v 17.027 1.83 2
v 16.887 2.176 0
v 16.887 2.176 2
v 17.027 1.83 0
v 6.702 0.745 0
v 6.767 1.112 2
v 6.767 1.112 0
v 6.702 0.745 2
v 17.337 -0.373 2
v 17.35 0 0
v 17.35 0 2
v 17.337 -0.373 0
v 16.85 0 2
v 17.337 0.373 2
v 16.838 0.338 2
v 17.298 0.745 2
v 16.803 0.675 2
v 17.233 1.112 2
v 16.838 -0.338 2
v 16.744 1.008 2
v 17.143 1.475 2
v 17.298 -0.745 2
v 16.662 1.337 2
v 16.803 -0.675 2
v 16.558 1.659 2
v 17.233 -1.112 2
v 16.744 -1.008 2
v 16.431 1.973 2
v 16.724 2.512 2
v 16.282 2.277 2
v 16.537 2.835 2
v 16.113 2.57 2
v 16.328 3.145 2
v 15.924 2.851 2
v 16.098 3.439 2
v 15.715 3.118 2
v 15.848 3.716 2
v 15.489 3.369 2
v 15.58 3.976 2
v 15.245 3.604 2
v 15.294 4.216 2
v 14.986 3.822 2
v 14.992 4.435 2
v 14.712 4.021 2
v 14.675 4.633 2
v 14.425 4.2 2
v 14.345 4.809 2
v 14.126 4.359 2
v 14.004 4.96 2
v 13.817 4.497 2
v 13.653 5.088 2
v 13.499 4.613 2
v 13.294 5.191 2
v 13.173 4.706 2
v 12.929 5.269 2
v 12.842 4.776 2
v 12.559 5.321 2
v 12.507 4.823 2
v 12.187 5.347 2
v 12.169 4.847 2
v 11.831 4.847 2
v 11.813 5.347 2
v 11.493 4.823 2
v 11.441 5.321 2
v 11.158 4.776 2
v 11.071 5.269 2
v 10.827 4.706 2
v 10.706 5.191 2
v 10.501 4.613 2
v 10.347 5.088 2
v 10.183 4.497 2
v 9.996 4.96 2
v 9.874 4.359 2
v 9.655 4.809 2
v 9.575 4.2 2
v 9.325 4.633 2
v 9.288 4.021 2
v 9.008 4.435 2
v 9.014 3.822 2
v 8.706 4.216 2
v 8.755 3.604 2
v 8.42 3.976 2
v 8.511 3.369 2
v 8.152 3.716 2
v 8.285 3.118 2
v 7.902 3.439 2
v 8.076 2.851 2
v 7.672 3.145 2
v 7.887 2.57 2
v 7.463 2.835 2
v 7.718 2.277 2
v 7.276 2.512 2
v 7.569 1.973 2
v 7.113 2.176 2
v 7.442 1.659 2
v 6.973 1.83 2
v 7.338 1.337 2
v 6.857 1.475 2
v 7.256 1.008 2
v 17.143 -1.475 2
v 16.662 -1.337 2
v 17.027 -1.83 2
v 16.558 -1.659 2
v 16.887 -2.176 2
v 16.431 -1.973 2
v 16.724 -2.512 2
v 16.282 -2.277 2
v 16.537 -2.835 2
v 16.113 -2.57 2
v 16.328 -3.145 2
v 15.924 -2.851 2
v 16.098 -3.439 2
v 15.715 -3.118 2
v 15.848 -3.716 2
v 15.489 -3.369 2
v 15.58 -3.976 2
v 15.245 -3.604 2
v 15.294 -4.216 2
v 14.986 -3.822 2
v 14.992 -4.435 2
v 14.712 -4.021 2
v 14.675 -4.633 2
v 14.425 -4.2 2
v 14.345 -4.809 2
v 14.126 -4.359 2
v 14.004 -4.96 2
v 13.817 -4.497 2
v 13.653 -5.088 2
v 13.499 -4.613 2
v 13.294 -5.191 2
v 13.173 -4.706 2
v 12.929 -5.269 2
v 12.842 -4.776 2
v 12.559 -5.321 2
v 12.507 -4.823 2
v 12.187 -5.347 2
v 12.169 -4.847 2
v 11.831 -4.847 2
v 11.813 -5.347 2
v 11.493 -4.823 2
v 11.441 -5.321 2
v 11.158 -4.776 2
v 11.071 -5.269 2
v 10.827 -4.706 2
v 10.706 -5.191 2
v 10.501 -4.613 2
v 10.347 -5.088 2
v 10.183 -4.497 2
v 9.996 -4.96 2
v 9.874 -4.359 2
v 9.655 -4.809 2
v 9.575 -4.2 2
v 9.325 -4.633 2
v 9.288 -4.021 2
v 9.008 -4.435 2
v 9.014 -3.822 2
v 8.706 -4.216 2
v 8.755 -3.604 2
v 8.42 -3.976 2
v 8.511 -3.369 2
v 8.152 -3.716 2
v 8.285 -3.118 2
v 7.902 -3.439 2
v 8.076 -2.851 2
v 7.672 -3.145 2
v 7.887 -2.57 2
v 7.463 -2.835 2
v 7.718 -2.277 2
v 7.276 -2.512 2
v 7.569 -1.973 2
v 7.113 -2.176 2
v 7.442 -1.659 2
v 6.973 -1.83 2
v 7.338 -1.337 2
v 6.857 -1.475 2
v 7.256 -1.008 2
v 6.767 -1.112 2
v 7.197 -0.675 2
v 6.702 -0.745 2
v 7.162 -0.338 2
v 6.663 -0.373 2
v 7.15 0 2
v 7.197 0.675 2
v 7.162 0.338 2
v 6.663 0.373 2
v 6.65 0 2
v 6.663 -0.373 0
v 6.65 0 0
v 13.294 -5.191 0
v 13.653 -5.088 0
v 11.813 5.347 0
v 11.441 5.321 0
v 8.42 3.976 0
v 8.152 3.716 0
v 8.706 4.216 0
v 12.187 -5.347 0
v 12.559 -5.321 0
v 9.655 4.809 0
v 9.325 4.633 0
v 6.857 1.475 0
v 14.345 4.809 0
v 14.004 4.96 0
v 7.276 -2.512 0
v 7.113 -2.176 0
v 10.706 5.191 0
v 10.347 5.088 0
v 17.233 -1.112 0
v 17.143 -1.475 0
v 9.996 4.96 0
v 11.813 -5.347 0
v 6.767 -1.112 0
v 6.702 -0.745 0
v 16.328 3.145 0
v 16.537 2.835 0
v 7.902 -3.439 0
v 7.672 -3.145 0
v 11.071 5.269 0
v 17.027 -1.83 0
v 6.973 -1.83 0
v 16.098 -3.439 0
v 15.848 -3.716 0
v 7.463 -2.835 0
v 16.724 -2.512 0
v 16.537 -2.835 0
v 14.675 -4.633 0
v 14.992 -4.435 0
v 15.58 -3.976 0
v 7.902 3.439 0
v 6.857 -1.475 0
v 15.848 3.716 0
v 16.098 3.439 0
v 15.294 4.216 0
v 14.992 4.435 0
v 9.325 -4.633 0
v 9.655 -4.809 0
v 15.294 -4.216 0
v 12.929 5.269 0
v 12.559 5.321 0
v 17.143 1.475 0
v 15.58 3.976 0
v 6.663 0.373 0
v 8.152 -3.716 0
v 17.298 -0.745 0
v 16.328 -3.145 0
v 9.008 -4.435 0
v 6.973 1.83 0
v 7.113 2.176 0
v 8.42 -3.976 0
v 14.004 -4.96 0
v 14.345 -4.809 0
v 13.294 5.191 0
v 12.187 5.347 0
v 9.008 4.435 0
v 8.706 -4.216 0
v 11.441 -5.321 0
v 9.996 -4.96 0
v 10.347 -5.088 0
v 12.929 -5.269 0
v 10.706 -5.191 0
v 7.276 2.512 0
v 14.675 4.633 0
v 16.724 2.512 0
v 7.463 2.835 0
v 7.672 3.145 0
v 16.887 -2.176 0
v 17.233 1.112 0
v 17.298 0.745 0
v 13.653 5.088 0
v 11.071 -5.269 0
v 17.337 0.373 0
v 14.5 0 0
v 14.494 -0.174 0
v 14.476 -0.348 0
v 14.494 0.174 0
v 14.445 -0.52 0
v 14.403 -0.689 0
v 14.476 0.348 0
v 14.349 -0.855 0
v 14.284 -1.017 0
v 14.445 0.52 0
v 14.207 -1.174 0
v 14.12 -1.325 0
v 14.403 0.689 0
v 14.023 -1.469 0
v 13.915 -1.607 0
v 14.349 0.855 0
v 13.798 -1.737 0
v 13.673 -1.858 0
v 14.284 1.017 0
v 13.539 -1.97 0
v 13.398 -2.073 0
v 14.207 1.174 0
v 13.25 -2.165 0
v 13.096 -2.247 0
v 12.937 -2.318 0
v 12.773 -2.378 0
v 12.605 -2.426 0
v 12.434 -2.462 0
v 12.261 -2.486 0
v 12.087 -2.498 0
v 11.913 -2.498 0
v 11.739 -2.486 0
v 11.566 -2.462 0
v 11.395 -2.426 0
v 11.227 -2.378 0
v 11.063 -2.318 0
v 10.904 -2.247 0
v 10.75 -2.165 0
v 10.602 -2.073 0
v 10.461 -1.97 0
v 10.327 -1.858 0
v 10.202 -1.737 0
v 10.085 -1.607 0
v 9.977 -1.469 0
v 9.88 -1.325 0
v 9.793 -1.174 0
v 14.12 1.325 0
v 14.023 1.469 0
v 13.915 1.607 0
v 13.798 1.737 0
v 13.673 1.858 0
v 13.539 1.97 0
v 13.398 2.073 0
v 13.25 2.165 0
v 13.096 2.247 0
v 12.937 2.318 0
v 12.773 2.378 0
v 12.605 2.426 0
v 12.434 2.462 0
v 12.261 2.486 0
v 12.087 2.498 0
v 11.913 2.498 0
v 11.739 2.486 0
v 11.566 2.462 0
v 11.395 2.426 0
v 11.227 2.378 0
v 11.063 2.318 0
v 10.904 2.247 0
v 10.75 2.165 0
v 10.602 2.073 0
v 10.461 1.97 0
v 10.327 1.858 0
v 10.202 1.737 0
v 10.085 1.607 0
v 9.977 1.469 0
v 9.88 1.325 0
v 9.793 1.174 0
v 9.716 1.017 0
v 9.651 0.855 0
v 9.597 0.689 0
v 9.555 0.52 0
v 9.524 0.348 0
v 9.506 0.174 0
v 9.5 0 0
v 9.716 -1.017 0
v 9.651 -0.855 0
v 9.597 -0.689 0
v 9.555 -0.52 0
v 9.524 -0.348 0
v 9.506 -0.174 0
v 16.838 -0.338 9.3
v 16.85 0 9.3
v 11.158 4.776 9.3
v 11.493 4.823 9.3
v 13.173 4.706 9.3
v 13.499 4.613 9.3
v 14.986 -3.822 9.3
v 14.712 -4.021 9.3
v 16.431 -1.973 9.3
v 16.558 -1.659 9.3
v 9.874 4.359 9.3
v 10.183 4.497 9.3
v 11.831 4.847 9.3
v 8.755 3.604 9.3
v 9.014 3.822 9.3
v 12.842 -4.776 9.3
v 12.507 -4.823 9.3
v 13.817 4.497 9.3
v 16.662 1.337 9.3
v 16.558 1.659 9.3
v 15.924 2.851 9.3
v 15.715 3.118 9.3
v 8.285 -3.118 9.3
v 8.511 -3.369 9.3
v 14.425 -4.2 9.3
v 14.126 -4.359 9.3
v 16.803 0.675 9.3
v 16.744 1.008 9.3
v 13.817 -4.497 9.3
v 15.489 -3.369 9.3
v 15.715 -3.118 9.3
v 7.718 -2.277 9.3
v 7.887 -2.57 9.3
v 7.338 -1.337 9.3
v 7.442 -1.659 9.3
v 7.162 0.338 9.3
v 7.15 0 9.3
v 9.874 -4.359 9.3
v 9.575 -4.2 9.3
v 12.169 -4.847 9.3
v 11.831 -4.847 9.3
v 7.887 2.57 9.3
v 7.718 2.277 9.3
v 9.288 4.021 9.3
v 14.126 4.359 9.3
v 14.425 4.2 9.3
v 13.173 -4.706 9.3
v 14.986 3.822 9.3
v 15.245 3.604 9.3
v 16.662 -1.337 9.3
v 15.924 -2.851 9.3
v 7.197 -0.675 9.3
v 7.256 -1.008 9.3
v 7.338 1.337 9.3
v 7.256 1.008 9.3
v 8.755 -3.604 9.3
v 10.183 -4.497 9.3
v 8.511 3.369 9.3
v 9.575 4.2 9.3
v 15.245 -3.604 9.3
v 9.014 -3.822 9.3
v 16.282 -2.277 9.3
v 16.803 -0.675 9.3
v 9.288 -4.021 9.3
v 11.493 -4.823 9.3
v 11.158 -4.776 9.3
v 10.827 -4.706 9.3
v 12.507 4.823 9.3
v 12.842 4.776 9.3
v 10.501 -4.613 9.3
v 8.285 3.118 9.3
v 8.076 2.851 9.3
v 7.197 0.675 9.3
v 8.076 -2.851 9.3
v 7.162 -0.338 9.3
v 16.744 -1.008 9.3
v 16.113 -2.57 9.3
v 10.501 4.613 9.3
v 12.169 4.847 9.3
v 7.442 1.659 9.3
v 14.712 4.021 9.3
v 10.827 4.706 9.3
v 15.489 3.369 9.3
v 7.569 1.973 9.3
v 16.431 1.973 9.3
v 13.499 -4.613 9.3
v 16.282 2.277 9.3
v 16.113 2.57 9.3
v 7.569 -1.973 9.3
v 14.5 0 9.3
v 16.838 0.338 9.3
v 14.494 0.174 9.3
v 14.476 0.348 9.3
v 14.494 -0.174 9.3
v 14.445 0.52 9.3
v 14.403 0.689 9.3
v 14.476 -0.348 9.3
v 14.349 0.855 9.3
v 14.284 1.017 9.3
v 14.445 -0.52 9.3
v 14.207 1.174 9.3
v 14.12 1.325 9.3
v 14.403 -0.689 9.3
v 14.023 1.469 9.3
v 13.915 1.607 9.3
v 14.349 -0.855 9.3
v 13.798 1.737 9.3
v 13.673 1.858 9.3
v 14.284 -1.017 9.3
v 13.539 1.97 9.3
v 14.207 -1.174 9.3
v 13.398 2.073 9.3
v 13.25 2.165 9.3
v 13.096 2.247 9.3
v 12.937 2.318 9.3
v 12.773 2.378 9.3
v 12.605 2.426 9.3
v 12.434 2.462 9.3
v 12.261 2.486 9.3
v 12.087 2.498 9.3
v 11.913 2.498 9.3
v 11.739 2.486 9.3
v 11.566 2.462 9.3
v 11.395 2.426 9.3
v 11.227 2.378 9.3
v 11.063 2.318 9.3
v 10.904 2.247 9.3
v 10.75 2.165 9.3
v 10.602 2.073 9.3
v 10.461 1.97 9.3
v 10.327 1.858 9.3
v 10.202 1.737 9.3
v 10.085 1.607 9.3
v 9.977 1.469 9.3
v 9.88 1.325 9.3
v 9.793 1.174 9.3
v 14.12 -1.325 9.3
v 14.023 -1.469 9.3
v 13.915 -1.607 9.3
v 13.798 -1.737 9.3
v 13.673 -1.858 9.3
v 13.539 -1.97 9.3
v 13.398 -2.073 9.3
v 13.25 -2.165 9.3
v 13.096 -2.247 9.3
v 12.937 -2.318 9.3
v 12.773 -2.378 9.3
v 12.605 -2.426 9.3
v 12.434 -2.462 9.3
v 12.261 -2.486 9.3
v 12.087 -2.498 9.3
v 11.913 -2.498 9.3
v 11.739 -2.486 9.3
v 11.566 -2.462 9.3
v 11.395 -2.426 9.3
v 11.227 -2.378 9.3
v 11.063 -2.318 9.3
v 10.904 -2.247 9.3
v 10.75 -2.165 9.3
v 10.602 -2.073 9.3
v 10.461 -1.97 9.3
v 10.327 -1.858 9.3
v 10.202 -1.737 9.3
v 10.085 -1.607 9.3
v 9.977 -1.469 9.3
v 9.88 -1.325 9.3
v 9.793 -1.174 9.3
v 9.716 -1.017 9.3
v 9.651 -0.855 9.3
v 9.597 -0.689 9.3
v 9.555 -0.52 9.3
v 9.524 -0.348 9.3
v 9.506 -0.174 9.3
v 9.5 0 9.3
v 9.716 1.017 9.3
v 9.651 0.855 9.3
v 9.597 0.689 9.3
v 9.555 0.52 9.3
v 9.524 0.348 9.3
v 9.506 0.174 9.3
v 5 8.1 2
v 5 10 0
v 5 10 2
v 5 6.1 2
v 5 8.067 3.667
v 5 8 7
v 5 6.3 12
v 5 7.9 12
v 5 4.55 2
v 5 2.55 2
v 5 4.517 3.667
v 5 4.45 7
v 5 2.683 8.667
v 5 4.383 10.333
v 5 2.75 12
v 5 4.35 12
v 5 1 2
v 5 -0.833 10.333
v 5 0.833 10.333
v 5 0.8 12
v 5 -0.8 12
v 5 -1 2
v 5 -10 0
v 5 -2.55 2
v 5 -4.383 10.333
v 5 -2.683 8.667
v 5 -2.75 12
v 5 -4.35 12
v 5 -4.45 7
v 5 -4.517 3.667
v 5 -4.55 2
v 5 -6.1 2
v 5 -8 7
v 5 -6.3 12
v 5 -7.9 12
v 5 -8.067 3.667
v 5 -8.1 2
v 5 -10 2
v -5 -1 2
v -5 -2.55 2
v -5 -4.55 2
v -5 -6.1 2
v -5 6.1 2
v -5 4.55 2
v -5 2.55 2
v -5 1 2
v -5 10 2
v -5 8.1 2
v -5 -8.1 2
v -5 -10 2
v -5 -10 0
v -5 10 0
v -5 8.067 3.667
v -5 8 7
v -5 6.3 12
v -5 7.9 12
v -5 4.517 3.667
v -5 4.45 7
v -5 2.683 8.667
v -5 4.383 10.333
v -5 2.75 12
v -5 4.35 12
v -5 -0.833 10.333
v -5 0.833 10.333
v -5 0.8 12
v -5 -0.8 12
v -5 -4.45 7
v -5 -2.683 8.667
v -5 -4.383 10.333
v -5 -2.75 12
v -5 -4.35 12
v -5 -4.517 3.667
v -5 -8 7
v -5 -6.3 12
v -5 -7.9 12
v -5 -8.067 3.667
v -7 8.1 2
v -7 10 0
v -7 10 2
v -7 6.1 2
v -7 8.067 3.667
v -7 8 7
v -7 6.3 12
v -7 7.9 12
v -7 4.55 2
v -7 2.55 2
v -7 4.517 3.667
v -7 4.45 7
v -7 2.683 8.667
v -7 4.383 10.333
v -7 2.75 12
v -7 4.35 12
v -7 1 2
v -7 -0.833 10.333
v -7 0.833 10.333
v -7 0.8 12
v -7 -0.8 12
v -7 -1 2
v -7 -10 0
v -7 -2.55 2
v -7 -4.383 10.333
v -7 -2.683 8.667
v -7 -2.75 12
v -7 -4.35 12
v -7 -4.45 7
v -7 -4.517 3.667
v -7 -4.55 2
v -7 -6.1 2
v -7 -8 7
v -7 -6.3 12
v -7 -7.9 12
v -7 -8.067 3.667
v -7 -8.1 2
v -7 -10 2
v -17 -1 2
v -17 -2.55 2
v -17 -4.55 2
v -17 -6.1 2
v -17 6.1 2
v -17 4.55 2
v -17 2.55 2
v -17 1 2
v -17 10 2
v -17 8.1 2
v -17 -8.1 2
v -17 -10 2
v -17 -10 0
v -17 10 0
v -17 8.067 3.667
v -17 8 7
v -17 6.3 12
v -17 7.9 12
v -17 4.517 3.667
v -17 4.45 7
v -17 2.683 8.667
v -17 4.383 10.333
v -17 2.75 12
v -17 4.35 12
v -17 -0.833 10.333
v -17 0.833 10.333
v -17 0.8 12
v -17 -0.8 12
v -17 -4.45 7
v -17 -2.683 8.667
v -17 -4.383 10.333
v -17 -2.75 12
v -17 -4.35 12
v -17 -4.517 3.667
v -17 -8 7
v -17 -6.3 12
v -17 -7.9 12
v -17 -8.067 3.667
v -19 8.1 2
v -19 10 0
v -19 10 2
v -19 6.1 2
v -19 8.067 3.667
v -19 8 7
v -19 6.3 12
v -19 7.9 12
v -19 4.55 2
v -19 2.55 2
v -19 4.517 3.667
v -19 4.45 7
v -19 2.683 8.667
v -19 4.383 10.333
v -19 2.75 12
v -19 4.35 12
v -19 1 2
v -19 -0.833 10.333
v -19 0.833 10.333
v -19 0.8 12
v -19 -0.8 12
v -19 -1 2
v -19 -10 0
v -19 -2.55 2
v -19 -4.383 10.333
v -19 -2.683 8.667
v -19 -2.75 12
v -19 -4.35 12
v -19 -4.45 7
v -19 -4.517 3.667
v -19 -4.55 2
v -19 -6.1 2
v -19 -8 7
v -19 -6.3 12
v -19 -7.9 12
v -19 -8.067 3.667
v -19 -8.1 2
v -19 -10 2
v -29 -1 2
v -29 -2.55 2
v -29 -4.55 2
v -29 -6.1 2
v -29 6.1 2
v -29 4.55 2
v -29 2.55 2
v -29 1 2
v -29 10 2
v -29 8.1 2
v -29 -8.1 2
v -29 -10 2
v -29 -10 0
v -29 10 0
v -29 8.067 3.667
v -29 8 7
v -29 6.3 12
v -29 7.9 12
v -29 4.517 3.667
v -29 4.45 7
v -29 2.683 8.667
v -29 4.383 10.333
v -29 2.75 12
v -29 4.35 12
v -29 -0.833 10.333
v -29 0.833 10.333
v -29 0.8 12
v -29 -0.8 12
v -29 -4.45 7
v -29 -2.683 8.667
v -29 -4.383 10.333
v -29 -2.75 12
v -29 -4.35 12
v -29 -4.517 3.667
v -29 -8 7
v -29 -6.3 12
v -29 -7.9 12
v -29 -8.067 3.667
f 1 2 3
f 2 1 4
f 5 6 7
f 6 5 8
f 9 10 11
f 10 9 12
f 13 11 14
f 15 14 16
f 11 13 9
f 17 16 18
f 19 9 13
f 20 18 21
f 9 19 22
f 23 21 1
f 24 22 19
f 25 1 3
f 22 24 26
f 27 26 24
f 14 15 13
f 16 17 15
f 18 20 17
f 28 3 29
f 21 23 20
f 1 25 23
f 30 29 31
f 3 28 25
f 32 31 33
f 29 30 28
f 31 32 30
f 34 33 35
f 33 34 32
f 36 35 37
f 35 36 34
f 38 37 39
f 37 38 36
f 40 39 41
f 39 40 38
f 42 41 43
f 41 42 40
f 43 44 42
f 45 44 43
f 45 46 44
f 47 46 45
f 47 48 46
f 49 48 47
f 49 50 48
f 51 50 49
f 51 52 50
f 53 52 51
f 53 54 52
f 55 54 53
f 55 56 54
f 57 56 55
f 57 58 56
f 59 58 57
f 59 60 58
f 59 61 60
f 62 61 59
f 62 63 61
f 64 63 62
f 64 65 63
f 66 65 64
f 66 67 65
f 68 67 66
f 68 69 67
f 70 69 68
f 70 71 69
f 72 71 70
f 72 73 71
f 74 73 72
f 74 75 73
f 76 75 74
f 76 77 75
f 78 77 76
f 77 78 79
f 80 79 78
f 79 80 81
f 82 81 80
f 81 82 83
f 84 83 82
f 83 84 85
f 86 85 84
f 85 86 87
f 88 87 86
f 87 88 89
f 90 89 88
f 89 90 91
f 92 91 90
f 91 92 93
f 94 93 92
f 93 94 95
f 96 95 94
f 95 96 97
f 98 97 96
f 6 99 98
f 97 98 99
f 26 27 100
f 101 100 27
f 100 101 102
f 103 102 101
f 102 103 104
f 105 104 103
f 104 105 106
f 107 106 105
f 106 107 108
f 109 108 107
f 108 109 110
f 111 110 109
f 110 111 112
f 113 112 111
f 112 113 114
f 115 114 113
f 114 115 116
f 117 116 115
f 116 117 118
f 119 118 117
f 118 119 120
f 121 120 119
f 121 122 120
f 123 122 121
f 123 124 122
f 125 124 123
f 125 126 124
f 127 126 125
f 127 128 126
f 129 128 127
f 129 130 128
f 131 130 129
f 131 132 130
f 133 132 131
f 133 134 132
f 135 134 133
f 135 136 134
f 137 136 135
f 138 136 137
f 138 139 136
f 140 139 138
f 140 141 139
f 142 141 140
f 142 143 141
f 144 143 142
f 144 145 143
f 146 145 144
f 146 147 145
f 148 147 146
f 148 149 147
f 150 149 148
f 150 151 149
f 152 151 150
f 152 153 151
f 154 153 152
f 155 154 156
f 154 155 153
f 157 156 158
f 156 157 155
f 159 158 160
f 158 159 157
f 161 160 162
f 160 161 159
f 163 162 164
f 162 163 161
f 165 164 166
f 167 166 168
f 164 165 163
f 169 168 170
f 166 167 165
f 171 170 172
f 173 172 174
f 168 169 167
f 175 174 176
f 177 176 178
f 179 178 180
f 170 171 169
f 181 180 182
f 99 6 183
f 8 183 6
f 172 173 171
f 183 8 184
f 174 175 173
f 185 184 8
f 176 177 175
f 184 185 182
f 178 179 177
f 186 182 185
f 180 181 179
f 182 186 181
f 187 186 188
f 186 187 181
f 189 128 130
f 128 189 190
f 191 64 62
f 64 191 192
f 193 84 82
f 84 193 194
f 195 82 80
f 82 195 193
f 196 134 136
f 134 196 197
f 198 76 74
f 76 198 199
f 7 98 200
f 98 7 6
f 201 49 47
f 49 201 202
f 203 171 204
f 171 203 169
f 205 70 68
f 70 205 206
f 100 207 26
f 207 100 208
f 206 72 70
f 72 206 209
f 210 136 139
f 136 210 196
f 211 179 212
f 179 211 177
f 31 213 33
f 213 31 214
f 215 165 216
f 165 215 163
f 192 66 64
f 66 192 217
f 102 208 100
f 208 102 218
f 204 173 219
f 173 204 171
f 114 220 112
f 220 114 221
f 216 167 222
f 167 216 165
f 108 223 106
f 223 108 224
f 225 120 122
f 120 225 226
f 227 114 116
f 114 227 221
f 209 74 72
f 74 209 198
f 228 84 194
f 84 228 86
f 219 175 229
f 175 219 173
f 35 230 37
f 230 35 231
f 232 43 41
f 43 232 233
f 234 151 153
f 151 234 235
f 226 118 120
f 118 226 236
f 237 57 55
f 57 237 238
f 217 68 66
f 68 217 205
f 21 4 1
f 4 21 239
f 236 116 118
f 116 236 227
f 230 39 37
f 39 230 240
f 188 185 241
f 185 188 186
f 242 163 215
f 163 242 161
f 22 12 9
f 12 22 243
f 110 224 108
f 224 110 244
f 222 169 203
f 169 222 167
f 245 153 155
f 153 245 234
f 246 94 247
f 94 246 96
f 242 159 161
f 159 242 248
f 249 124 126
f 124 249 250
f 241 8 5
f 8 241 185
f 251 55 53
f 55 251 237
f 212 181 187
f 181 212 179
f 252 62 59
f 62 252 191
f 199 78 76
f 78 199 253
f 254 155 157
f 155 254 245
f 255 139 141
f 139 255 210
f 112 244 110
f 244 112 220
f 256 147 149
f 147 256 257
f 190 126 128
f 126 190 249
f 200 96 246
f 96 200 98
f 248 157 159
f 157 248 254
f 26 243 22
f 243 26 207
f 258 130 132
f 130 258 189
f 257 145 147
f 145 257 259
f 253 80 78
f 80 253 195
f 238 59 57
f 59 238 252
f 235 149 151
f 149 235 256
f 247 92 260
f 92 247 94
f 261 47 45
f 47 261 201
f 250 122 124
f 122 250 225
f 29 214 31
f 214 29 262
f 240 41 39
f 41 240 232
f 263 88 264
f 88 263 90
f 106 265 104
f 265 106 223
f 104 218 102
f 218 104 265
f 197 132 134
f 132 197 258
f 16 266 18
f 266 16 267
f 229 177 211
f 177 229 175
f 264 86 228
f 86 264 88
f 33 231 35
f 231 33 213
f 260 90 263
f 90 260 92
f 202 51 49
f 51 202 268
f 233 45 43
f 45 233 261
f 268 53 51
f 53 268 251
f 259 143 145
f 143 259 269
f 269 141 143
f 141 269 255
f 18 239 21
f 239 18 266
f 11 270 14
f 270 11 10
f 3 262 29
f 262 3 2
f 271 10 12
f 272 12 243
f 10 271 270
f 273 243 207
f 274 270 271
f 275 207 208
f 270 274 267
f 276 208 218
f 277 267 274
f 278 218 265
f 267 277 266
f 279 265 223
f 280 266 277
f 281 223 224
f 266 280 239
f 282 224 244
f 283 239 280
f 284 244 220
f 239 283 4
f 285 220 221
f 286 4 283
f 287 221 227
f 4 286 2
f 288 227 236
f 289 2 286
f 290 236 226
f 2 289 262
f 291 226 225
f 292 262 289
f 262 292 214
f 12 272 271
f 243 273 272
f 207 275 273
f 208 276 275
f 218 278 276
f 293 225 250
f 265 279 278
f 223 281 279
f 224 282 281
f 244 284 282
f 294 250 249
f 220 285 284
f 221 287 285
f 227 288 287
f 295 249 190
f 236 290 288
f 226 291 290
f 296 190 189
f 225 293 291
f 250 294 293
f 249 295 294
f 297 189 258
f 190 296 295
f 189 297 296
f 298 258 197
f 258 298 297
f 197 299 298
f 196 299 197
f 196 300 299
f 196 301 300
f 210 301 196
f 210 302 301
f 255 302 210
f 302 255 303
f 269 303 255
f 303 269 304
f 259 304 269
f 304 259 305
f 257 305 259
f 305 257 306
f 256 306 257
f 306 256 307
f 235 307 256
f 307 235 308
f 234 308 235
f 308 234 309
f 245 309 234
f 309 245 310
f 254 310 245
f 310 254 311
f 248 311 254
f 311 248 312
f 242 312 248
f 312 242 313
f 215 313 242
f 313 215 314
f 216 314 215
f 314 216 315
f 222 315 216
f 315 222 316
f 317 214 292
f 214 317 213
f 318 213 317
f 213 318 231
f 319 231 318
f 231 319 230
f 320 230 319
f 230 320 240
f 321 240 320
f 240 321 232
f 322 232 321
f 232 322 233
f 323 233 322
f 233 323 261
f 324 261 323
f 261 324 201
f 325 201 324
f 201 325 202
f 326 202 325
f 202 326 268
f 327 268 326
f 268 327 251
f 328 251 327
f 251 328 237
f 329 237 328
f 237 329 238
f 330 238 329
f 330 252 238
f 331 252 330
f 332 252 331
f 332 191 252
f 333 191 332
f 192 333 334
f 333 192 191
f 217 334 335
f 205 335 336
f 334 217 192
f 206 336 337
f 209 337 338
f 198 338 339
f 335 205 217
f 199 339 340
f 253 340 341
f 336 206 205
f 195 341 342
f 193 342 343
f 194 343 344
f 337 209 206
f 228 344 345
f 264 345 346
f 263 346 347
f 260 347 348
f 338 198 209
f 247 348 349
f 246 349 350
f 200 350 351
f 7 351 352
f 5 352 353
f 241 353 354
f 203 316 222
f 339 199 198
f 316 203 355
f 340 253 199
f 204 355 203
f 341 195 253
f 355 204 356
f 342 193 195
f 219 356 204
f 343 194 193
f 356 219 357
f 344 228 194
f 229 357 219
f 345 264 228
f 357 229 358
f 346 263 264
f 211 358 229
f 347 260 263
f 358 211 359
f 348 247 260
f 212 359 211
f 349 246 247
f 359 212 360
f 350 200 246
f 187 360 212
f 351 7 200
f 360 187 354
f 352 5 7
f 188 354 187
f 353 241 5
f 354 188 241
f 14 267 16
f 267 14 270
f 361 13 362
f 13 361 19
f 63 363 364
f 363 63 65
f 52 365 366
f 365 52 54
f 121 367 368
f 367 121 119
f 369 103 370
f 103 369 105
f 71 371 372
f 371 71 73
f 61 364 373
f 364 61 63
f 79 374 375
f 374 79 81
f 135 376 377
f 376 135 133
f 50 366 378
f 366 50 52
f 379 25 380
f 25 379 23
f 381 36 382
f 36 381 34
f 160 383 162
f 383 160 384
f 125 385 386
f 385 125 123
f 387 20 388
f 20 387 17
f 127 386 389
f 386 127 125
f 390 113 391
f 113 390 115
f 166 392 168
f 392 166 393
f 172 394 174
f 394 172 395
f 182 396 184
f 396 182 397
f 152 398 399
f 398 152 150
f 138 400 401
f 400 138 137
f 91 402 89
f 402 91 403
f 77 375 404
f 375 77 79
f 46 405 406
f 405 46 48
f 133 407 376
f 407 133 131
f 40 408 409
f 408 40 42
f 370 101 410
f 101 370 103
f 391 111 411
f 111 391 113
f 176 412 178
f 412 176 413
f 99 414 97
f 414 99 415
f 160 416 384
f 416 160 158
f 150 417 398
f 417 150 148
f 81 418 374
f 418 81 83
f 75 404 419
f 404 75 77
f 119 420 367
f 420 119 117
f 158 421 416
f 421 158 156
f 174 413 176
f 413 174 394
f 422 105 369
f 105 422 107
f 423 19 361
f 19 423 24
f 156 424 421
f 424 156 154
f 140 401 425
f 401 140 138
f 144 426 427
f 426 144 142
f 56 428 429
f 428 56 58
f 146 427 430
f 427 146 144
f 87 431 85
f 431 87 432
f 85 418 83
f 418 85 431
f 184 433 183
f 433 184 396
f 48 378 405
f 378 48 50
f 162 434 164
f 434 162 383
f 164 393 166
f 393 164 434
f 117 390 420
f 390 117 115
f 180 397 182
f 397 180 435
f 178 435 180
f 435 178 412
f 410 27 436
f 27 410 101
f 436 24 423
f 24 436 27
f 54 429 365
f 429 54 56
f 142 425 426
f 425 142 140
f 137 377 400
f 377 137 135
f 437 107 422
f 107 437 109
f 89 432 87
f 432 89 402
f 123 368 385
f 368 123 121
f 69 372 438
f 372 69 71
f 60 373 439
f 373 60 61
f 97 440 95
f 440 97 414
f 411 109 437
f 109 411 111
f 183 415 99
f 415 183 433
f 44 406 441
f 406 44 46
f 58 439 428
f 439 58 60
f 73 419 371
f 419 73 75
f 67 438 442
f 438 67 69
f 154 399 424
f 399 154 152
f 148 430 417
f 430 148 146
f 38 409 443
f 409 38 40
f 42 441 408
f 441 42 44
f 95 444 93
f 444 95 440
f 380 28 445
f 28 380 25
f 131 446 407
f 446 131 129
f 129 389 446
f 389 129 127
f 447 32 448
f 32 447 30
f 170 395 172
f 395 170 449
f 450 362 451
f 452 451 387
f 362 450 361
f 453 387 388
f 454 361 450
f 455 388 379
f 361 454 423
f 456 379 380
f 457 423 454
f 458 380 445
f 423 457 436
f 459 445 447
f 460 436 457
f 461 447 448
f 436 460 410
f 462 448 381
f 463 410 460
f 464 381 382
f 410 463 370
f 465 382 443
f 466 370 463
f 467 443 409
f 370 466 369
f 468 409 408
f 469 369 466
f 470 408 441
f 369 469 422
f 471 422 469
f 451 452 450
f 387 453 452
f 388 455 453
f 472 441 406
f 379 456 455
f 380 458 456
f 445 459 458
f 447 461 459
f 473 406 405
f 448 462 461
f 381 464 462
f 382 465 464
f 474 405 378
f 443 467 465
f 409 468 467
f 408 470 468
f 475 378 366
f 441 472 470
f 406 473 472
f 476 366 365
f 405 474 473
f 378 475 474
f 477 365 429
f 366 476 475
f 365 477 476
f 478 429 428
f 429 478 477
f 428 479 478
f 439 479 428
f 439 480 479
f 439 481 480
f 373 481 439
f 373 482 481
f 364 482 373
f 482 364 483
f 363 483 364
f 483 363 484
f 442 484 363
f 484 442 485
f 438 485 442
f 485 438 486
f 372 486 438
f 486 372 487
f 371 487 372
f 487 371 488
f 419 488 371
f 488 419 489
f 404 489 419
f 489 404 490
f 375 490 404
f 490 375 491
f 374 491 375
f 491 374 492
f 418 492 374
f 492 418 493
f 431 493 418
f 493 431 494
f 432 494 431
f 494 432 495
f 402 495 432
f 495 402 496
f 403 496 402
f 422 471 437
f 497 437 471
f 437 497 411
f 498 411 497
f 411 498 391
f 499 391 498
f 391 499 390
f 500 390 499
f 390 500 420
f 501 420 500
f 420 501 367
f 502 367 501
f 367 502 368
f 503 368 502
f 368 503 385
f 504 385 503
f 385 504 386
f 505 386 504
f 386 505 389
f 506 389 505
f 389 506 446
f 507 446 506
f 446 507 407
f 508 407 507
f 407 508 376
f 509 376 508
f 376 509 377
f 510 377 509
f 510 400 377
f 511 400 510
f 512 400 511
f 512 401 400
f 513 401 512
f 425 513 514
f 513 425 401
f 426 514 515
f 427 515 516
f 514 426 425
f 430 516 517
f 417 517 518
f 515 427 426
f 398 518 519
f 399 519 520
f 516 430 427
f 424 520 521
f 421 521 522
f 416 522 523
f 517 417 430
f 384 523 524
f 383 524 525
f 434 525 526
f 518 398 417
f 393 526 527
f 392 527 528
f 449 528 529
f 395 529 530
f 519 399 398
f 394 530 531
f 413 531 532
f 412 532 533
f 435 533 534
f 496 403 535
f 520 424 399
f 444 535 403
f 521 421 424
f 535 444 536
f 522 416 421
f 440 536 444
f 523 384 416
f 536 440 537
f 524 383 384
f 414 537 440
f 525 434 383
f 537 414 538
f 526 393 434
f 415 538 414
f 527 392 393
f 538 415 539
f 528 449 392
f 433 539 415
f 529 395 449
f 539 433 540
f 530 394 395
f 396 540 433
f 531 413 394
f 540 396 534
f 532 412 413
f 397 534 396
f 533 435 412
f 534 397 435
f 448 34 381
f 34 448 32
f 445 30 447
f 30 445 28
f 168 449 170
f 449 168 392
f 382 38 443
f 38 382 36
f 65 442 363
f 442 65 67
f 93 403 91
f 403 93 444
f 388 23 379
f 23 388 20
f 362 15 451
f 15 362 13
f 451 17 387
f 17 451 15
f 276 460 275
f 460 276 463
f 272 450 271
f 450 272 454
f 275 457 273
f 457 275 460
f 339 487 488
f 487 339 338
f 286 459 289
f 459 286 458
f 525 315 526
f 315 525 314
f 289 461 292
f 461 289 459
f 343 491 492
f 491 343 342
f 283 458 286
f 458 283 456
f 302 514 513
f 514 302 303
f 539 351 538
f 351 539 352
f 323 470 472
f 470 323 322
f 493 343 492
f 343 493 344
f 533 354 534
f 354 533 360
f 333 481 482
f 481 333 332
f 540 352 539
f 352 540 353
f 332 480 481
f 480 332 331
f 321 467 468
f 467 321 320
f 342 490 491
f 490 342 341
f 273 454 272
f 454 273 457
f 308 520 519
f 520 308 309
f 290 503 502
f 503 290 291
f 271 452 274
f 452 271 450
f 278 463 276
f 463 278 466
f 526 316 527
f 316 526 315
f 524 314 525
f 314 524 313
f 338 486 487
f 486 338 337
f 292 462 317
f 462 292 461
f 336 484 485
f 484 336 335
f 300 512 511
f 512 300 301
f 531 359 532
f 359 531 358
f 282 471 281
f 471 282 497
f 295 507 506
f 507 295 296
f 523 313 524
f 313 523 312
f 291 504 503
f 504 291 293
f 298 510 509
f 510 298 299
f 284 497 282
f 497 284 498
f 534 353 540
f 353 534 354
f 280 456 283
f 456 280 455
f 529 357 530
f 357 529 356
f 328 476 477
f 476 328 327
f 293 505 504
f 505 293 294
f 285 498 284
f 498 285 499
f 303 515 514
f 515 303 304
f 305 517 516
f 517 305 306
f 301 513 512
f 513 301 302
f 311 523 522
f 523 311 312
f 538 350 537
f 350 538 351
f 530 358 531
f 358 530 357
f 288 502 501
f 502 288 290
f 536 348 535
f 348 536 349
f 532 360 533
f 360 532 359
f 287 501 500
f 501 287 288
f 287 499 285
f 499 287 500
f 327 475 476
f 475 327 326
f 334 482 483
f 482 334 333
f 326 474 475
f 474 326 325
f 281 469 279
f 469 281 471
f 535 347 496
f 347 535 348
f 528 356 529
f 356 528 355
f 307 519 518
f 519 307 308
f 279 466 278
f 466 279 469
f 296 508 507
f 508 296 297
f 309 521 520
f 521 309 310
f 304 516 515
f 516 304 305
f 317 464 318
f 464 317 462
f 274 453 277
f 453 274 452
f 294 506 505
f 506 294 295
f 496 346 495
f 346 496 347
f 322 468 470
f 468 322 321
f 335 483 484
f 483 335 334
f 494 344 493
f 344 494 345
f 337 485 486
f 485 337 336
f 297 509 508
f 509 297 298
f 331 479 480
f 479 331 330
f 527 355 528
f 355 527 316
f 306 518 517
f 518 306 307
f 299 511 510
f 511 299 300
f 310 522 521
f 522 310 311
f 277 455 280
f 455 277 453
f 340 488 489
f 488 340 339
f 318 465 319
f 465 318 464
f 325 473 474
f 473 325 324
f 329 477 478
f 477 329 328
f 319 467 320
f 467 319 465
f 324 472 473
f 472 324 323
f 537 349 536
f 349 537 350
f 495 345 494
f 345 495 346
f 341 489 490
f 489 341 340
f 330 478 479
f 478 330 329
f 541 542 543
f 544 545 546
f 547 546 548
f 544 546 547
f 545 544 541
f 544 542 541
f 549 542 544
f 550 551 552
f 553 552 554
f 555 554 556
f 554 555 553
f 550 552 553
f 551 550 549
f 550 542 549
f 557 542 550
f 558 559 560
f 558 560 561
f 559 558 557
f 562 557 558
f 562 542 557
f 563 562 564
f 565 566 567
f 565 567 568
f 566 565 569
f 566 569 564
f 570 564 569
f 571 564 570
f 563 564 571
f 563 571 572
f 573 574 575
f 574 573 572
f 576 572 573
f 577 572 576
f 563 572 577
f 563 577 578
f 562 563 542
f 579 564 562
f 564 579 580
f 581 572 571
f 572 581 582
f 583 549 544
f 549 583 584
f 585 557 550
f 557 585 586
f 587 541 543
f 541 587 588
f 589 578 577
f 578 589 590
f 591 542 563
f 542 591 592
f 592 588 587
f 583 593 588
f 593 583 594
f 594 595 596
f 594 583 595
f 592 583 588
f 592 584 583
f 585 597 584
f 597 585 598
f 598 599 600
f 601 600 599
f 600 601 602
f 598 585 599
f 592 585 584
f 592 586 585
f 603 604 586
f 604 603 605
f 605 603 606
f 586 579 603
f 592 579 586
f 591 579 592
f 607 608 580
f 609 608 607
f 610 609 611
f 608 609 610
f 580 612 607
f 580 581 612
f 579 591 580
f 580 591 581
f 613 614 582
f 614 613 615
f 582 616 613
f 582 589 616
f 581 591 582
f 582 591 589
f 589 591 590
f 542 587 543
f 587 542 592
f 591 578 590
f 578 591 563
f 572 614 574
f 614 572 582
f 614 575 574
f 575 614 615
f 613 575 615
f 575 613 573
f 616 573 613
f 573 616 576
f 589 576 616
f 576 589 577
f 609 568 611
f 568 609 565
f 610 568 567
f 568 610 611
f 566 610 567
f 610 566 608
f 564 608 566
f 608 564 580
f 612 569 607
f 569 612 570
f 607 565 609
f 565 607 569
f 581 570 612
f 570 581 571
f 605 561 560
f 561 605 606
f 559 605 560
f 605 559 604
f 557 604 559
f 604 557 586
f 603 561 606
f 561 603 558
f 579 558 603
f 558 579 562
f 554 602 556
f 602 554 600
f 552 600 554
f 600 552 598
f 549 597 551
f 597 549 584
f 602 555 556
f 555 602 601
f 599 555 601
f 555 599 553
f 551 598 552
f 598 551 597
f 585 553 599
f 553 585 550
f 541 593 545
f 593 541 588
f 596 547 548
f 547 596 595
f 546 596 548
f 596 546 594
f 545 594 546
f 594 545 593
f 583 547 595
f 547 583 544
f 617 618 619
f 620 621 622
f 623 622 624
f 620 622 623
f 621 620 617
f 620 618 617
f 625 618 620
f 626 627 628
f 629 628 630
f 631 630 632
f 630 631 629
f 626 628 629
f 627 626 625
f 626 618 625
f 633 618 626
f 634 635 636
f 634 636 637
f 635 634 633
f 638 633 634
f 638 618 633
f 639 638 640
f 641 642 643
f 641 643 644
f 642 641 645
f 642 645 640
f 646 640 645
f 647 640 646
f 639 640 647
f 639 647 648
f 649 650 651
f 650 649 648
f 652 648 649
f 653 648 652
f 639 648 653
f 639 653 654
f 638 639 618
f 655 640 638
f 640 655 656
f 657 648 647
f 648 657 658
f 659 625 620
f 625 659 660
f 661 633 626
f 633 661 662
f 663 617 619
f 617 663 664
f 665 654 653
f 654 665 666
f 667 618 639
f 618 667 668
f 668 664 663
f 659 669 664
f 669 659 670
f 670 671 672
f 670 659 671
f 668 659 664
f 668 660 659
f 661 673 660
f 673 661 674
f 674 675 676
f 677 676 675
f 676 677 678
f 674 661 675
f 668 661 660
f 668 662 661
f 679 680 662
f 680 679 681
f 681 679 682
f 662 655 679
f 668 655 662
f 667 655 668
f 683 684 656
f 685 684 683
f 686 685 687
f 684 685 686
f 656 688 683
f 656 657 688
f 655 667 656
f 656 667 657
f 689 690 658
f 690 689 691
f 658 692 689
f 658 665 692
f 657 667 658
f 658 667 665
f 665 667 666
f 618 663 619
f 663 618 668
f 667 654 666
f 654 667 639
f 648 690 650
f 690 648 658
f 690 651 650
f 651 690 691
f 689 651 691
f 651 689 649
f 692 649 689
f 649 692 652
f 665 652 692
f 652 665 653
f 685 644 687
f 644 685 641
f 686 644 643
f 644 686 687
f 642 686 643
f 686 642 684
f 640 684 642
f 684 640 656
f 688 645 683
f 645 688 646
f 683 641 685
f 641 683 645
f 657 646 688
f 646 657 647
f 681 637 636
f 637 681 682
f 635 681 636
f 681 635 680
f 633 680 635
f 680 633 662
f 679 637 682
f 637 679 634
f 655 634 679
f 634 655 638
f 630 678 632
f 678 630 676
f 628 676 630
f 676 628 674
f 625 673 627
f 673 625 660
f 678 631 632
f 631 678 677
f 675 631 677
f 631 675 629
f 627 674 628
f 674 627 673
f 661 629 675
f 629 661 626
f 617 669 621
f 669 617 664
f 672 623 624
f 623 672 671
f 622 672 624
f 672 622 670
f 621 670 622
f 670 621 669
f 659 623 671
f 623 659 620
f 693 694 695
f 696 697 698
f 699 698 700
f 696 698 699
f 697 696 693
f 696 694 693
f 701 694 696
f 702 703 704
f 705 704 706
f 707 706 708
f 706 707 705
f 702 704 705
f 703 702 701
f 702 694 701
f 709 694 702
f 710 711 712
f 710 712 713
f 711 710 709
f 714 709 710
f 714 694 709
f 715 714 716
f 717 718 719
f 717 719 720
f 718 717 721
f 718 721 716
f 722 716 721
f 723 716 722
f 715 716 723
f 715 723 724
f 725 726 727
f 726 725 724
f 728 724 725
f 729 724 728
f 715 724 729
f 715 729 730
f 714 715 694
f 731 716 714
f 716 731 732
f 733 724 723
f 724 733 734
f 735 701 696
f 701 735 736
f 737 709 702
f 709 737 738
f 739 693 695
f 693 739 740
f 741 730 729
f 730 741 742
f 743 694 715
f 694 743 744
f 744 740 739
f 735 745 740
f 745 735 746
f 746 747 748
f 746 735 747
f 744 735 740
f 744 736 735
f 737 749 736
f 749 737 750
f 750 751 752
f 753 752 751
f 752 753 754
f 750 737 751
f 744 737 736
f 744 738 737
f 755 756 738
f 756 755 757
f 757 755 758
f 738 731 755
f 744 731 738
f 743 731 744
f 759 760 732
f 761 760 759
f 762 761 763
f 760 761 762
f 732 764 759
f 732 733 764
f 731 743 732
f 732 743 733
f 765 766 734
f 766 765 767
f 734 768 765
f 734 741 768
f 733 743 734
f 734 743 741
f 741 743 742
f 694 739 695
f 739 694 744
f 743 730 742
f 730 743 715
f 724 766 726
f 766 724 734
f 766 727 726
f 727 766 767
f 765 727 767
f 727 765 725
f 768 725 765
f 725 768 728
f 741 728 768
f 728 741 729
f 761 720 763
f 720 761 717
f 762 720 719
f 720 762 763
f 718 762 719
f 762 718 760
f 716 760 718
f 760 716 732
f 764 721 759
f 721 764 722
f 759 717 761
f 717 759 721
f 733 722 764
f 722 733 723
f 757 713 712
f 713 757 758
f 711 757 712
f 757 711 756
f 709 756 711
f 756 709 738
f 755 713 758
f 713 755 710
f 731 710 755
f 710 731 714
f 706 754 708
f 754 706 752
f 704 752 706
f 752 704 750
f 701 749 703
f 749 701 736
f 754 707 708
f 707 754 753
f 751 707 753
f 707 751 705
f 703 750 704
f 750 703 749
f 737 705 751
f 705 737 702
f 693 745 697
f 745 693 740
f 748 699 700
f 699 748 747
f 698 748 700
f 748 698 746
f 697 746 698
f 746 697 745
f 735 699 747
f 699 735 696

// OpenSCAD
// Simple horizontal bearing for a Filament Coil
//
// print 2 cone instances and stack them.
// or print spokewheels to put reels in a box
//
// Andreas Merz 21.12.2018, v0.5, GPL



module cone(dia=53, h=68) {
  difference() {
    union() {
      translate([0,0,1])
        linear_extrude(height = h*10/11-2, scale = 0.025)    // base cone
          circle(dia/2, $fn = 90);
      translate([0,0,2])
        linear_extrude(height = h-2, scale = 0.02)  // tip cone
          circle(dia/3, $fn = 90);
      linear_extrude(height = 2, scale = 1)      // rim
        circle(dia/2 +3, $fn = 90 );
      }
    translate([0,0,-0.1])
      linear_extrude(height = h*10/11-2, scale = 0.02)    // cone boring
        circle(dia/2, $fn = 90);
  }
}  


// This wheel has the rim on top, because of the integrated spacer
    
module spokewheelA(dia=58, h=5, th=3, diabore=5) {
  difference() {
    union() {
      rotate_extrude($fn = 80)
        translate([dia/2-th, 0, 0])  // rim 
             polygon( points=[[0,0],[th-0.2,0],[th,h-2],[th+4,h-1],[th+4,h],[0,h]] );
      
      linear_extrude(height = h)    // spoke x
             polygon( points=[[dia/2-1,-2.5],[dia/2-1,2.5],[-dia/2+1,2.5],[-dia/2+1,-2.5]]);
      linear_extrude(height = h)    // spoke y
             polygon( points=[[-2.5,dia/2-1],[2.5,dia/2-1],[2.5,-dia/2+1],[-2.5,-dia/2+1]]);
      
      linear_extrude(height = h)    // hub 
          circle(th+diabore*0.8, $fn = 90);
      linear_extrude(height = h+2)    // spacer 
          circle(diabore/2+2, $fn = 90);
    }
    translate([0,0,-1])
      linear_extrude(height = h+4)    // bore hole
        circle(diabore/2, $fn = 90);
  }
}


// This wheel has the rim on the bottom which is easier to print, 
// but outer spacer needs to be a separate part
    
module spokewheelB(dia=58, h=5, th=3, diabore=10) {
  difference() {
    union() {
      rotate_extrude($fn = 80)
        translate([dia/2-th, 0, 0])  // rim 
             polygon( points=[[0,0],[th+4,0],[th+4,1],[th,1],[th,h],[0,h]] );
      
      linear_extrude(height = h)    // spoke x
             polygon( points=[[dia/2-1,-2.5],[dia/2-1,2.5],[-dia/2+1,2.5],[-dia/2+1,-2.5]]);
      linear_extrude(height = h)    // spoke y
             polygon( points=[[-2.5,dia/2-1],[2.5,dia/2-1],[2.5,-dia/2+1],[-2.5,-dia/2+1]]);
      
      linear_extrude(height = h)    // hub 
          circle(th+diabore*0.8, $fn = 90);
      //linear_extrude(height = h+2)    // spacer 
          //circle(diabore/2+2, $fn = 90);
    }
    translate([0,0,-1])
      linear_extrude(height = h+4)    // bore hole
        circle(diabore/2, $fn = 90);
  }
}
    
    
    
module axeA(d=5, h=2) {
    union() {
      linear_extrude(height = 2.5)    //  
        circle(d/2-0.2, $fn = 90);
      translate([0,0,2.5])
          linear_extrude(height = 1)    // rim
            circle((d+1)/2, $fn = 90);
      translate([0,0,2.5])
          linear_extrude(height = 7, scale=0.1)    // tip
            circle(d/2, $fn = 90);
  }
}

module axeB(diabore=10, h=3) {
    union() {
      linear_extrude(height = h)    //  
        circle(diabore/2-0.1, $fn = 90);
      translate([0,0,h])
          linear_extrude(height = 1)    // rim
            circle((diabore+1)/2, $fn = 90);
      translate([0,0,3+1])
          linear_extrude(height = 2*h, scale=0.1)    // tip
            circle(diabore/4, $fn = 90);
  }
}

module inset(diabore=10, h=7, hrim=2) {
  c=0.3;
  difference() {
    union() {
      linear_extrude(height = hrim)    // rim
        circle((diabore+1-c)/2, $fn = 90);
      linear_extrude(height = h)    //  
        circle((diabore-c)/2, $fn = 90);
    }
    translate([0,0,-1])
      linear_extrude(height = h+4)    // bore hole
        circle(diabore/4, $fn = 90);  // 5mm center hole
    
  }
}


//-------------------------------------
// Laufrolle fuer Kirchenweg Glashaus
//-------------------------------------
module rolle(di=10) {
         c=0.4;
         rotate_extrude($fn = 80)
           translate([(di+c)/2, 0, 0])
             difference() {
               polygon( [[(22-(di+c))/2,   9-c], [(1+c)/2,9-c], [(1+c)/2,7-c], [0,7-c], [0,0], [(22-(di+c))/2,0]]);
               //square( [(22-(di+c))/2,   9-c]);
               translate([(22-(di+c)+1)/2, (9-c)/2]) circle(r=5/2);
             }
}

//-------------------------------------
// Filament Clip
//-------------------------------------
module filamentclip(di=9) {
         c=0.2;
         d=1.75;  // filament diameter
         union() {
           translate([ 0, 0, 1]) cube([10,20,2], center=true);
           translate([ 0, -2*(2+d-c),2])   linear_extrude(height=10, scale=[1, 0.8]) square([10,2], center=true);
           translate([ 0, -1*(2+d-c),2])   linear_extrude(height=10, scale=[1, 0.8]) square([10,2], center=true);
           translate([ 0,  0*(2+d-c),2])   linear_extrude(height=10, scale=[1, 0.8]) square([10,2], center=true);
           translate([ 0,  1*(2+d-c),2])   linear_extrude(height=10, scale=[1, 0.8]) square([10,2], center=true);
           translate([ 0,  2*(2+d-c),2])   linear_extrude(height=10, scale=[1, 0.8]) square([10,2], center=true);
    }
}


//------------- Instances --------------------


//cone();
//spokewheelB();
//spokewheelB(dia=53);

//translate([12,12,0]) inset();
//translate([12,-12,0]) inset(h=21, hrim=14);  // extended inset
//translate([-12,-12,0]) axeB();


translate([12,0,0]) inset(h=9.3);
//rolle();


translate([-0*12,0,0]) filamentclip();
translate([-1*12,0,0]) filamentclip();
translate([-2*12,0,0]) filamentclip();
